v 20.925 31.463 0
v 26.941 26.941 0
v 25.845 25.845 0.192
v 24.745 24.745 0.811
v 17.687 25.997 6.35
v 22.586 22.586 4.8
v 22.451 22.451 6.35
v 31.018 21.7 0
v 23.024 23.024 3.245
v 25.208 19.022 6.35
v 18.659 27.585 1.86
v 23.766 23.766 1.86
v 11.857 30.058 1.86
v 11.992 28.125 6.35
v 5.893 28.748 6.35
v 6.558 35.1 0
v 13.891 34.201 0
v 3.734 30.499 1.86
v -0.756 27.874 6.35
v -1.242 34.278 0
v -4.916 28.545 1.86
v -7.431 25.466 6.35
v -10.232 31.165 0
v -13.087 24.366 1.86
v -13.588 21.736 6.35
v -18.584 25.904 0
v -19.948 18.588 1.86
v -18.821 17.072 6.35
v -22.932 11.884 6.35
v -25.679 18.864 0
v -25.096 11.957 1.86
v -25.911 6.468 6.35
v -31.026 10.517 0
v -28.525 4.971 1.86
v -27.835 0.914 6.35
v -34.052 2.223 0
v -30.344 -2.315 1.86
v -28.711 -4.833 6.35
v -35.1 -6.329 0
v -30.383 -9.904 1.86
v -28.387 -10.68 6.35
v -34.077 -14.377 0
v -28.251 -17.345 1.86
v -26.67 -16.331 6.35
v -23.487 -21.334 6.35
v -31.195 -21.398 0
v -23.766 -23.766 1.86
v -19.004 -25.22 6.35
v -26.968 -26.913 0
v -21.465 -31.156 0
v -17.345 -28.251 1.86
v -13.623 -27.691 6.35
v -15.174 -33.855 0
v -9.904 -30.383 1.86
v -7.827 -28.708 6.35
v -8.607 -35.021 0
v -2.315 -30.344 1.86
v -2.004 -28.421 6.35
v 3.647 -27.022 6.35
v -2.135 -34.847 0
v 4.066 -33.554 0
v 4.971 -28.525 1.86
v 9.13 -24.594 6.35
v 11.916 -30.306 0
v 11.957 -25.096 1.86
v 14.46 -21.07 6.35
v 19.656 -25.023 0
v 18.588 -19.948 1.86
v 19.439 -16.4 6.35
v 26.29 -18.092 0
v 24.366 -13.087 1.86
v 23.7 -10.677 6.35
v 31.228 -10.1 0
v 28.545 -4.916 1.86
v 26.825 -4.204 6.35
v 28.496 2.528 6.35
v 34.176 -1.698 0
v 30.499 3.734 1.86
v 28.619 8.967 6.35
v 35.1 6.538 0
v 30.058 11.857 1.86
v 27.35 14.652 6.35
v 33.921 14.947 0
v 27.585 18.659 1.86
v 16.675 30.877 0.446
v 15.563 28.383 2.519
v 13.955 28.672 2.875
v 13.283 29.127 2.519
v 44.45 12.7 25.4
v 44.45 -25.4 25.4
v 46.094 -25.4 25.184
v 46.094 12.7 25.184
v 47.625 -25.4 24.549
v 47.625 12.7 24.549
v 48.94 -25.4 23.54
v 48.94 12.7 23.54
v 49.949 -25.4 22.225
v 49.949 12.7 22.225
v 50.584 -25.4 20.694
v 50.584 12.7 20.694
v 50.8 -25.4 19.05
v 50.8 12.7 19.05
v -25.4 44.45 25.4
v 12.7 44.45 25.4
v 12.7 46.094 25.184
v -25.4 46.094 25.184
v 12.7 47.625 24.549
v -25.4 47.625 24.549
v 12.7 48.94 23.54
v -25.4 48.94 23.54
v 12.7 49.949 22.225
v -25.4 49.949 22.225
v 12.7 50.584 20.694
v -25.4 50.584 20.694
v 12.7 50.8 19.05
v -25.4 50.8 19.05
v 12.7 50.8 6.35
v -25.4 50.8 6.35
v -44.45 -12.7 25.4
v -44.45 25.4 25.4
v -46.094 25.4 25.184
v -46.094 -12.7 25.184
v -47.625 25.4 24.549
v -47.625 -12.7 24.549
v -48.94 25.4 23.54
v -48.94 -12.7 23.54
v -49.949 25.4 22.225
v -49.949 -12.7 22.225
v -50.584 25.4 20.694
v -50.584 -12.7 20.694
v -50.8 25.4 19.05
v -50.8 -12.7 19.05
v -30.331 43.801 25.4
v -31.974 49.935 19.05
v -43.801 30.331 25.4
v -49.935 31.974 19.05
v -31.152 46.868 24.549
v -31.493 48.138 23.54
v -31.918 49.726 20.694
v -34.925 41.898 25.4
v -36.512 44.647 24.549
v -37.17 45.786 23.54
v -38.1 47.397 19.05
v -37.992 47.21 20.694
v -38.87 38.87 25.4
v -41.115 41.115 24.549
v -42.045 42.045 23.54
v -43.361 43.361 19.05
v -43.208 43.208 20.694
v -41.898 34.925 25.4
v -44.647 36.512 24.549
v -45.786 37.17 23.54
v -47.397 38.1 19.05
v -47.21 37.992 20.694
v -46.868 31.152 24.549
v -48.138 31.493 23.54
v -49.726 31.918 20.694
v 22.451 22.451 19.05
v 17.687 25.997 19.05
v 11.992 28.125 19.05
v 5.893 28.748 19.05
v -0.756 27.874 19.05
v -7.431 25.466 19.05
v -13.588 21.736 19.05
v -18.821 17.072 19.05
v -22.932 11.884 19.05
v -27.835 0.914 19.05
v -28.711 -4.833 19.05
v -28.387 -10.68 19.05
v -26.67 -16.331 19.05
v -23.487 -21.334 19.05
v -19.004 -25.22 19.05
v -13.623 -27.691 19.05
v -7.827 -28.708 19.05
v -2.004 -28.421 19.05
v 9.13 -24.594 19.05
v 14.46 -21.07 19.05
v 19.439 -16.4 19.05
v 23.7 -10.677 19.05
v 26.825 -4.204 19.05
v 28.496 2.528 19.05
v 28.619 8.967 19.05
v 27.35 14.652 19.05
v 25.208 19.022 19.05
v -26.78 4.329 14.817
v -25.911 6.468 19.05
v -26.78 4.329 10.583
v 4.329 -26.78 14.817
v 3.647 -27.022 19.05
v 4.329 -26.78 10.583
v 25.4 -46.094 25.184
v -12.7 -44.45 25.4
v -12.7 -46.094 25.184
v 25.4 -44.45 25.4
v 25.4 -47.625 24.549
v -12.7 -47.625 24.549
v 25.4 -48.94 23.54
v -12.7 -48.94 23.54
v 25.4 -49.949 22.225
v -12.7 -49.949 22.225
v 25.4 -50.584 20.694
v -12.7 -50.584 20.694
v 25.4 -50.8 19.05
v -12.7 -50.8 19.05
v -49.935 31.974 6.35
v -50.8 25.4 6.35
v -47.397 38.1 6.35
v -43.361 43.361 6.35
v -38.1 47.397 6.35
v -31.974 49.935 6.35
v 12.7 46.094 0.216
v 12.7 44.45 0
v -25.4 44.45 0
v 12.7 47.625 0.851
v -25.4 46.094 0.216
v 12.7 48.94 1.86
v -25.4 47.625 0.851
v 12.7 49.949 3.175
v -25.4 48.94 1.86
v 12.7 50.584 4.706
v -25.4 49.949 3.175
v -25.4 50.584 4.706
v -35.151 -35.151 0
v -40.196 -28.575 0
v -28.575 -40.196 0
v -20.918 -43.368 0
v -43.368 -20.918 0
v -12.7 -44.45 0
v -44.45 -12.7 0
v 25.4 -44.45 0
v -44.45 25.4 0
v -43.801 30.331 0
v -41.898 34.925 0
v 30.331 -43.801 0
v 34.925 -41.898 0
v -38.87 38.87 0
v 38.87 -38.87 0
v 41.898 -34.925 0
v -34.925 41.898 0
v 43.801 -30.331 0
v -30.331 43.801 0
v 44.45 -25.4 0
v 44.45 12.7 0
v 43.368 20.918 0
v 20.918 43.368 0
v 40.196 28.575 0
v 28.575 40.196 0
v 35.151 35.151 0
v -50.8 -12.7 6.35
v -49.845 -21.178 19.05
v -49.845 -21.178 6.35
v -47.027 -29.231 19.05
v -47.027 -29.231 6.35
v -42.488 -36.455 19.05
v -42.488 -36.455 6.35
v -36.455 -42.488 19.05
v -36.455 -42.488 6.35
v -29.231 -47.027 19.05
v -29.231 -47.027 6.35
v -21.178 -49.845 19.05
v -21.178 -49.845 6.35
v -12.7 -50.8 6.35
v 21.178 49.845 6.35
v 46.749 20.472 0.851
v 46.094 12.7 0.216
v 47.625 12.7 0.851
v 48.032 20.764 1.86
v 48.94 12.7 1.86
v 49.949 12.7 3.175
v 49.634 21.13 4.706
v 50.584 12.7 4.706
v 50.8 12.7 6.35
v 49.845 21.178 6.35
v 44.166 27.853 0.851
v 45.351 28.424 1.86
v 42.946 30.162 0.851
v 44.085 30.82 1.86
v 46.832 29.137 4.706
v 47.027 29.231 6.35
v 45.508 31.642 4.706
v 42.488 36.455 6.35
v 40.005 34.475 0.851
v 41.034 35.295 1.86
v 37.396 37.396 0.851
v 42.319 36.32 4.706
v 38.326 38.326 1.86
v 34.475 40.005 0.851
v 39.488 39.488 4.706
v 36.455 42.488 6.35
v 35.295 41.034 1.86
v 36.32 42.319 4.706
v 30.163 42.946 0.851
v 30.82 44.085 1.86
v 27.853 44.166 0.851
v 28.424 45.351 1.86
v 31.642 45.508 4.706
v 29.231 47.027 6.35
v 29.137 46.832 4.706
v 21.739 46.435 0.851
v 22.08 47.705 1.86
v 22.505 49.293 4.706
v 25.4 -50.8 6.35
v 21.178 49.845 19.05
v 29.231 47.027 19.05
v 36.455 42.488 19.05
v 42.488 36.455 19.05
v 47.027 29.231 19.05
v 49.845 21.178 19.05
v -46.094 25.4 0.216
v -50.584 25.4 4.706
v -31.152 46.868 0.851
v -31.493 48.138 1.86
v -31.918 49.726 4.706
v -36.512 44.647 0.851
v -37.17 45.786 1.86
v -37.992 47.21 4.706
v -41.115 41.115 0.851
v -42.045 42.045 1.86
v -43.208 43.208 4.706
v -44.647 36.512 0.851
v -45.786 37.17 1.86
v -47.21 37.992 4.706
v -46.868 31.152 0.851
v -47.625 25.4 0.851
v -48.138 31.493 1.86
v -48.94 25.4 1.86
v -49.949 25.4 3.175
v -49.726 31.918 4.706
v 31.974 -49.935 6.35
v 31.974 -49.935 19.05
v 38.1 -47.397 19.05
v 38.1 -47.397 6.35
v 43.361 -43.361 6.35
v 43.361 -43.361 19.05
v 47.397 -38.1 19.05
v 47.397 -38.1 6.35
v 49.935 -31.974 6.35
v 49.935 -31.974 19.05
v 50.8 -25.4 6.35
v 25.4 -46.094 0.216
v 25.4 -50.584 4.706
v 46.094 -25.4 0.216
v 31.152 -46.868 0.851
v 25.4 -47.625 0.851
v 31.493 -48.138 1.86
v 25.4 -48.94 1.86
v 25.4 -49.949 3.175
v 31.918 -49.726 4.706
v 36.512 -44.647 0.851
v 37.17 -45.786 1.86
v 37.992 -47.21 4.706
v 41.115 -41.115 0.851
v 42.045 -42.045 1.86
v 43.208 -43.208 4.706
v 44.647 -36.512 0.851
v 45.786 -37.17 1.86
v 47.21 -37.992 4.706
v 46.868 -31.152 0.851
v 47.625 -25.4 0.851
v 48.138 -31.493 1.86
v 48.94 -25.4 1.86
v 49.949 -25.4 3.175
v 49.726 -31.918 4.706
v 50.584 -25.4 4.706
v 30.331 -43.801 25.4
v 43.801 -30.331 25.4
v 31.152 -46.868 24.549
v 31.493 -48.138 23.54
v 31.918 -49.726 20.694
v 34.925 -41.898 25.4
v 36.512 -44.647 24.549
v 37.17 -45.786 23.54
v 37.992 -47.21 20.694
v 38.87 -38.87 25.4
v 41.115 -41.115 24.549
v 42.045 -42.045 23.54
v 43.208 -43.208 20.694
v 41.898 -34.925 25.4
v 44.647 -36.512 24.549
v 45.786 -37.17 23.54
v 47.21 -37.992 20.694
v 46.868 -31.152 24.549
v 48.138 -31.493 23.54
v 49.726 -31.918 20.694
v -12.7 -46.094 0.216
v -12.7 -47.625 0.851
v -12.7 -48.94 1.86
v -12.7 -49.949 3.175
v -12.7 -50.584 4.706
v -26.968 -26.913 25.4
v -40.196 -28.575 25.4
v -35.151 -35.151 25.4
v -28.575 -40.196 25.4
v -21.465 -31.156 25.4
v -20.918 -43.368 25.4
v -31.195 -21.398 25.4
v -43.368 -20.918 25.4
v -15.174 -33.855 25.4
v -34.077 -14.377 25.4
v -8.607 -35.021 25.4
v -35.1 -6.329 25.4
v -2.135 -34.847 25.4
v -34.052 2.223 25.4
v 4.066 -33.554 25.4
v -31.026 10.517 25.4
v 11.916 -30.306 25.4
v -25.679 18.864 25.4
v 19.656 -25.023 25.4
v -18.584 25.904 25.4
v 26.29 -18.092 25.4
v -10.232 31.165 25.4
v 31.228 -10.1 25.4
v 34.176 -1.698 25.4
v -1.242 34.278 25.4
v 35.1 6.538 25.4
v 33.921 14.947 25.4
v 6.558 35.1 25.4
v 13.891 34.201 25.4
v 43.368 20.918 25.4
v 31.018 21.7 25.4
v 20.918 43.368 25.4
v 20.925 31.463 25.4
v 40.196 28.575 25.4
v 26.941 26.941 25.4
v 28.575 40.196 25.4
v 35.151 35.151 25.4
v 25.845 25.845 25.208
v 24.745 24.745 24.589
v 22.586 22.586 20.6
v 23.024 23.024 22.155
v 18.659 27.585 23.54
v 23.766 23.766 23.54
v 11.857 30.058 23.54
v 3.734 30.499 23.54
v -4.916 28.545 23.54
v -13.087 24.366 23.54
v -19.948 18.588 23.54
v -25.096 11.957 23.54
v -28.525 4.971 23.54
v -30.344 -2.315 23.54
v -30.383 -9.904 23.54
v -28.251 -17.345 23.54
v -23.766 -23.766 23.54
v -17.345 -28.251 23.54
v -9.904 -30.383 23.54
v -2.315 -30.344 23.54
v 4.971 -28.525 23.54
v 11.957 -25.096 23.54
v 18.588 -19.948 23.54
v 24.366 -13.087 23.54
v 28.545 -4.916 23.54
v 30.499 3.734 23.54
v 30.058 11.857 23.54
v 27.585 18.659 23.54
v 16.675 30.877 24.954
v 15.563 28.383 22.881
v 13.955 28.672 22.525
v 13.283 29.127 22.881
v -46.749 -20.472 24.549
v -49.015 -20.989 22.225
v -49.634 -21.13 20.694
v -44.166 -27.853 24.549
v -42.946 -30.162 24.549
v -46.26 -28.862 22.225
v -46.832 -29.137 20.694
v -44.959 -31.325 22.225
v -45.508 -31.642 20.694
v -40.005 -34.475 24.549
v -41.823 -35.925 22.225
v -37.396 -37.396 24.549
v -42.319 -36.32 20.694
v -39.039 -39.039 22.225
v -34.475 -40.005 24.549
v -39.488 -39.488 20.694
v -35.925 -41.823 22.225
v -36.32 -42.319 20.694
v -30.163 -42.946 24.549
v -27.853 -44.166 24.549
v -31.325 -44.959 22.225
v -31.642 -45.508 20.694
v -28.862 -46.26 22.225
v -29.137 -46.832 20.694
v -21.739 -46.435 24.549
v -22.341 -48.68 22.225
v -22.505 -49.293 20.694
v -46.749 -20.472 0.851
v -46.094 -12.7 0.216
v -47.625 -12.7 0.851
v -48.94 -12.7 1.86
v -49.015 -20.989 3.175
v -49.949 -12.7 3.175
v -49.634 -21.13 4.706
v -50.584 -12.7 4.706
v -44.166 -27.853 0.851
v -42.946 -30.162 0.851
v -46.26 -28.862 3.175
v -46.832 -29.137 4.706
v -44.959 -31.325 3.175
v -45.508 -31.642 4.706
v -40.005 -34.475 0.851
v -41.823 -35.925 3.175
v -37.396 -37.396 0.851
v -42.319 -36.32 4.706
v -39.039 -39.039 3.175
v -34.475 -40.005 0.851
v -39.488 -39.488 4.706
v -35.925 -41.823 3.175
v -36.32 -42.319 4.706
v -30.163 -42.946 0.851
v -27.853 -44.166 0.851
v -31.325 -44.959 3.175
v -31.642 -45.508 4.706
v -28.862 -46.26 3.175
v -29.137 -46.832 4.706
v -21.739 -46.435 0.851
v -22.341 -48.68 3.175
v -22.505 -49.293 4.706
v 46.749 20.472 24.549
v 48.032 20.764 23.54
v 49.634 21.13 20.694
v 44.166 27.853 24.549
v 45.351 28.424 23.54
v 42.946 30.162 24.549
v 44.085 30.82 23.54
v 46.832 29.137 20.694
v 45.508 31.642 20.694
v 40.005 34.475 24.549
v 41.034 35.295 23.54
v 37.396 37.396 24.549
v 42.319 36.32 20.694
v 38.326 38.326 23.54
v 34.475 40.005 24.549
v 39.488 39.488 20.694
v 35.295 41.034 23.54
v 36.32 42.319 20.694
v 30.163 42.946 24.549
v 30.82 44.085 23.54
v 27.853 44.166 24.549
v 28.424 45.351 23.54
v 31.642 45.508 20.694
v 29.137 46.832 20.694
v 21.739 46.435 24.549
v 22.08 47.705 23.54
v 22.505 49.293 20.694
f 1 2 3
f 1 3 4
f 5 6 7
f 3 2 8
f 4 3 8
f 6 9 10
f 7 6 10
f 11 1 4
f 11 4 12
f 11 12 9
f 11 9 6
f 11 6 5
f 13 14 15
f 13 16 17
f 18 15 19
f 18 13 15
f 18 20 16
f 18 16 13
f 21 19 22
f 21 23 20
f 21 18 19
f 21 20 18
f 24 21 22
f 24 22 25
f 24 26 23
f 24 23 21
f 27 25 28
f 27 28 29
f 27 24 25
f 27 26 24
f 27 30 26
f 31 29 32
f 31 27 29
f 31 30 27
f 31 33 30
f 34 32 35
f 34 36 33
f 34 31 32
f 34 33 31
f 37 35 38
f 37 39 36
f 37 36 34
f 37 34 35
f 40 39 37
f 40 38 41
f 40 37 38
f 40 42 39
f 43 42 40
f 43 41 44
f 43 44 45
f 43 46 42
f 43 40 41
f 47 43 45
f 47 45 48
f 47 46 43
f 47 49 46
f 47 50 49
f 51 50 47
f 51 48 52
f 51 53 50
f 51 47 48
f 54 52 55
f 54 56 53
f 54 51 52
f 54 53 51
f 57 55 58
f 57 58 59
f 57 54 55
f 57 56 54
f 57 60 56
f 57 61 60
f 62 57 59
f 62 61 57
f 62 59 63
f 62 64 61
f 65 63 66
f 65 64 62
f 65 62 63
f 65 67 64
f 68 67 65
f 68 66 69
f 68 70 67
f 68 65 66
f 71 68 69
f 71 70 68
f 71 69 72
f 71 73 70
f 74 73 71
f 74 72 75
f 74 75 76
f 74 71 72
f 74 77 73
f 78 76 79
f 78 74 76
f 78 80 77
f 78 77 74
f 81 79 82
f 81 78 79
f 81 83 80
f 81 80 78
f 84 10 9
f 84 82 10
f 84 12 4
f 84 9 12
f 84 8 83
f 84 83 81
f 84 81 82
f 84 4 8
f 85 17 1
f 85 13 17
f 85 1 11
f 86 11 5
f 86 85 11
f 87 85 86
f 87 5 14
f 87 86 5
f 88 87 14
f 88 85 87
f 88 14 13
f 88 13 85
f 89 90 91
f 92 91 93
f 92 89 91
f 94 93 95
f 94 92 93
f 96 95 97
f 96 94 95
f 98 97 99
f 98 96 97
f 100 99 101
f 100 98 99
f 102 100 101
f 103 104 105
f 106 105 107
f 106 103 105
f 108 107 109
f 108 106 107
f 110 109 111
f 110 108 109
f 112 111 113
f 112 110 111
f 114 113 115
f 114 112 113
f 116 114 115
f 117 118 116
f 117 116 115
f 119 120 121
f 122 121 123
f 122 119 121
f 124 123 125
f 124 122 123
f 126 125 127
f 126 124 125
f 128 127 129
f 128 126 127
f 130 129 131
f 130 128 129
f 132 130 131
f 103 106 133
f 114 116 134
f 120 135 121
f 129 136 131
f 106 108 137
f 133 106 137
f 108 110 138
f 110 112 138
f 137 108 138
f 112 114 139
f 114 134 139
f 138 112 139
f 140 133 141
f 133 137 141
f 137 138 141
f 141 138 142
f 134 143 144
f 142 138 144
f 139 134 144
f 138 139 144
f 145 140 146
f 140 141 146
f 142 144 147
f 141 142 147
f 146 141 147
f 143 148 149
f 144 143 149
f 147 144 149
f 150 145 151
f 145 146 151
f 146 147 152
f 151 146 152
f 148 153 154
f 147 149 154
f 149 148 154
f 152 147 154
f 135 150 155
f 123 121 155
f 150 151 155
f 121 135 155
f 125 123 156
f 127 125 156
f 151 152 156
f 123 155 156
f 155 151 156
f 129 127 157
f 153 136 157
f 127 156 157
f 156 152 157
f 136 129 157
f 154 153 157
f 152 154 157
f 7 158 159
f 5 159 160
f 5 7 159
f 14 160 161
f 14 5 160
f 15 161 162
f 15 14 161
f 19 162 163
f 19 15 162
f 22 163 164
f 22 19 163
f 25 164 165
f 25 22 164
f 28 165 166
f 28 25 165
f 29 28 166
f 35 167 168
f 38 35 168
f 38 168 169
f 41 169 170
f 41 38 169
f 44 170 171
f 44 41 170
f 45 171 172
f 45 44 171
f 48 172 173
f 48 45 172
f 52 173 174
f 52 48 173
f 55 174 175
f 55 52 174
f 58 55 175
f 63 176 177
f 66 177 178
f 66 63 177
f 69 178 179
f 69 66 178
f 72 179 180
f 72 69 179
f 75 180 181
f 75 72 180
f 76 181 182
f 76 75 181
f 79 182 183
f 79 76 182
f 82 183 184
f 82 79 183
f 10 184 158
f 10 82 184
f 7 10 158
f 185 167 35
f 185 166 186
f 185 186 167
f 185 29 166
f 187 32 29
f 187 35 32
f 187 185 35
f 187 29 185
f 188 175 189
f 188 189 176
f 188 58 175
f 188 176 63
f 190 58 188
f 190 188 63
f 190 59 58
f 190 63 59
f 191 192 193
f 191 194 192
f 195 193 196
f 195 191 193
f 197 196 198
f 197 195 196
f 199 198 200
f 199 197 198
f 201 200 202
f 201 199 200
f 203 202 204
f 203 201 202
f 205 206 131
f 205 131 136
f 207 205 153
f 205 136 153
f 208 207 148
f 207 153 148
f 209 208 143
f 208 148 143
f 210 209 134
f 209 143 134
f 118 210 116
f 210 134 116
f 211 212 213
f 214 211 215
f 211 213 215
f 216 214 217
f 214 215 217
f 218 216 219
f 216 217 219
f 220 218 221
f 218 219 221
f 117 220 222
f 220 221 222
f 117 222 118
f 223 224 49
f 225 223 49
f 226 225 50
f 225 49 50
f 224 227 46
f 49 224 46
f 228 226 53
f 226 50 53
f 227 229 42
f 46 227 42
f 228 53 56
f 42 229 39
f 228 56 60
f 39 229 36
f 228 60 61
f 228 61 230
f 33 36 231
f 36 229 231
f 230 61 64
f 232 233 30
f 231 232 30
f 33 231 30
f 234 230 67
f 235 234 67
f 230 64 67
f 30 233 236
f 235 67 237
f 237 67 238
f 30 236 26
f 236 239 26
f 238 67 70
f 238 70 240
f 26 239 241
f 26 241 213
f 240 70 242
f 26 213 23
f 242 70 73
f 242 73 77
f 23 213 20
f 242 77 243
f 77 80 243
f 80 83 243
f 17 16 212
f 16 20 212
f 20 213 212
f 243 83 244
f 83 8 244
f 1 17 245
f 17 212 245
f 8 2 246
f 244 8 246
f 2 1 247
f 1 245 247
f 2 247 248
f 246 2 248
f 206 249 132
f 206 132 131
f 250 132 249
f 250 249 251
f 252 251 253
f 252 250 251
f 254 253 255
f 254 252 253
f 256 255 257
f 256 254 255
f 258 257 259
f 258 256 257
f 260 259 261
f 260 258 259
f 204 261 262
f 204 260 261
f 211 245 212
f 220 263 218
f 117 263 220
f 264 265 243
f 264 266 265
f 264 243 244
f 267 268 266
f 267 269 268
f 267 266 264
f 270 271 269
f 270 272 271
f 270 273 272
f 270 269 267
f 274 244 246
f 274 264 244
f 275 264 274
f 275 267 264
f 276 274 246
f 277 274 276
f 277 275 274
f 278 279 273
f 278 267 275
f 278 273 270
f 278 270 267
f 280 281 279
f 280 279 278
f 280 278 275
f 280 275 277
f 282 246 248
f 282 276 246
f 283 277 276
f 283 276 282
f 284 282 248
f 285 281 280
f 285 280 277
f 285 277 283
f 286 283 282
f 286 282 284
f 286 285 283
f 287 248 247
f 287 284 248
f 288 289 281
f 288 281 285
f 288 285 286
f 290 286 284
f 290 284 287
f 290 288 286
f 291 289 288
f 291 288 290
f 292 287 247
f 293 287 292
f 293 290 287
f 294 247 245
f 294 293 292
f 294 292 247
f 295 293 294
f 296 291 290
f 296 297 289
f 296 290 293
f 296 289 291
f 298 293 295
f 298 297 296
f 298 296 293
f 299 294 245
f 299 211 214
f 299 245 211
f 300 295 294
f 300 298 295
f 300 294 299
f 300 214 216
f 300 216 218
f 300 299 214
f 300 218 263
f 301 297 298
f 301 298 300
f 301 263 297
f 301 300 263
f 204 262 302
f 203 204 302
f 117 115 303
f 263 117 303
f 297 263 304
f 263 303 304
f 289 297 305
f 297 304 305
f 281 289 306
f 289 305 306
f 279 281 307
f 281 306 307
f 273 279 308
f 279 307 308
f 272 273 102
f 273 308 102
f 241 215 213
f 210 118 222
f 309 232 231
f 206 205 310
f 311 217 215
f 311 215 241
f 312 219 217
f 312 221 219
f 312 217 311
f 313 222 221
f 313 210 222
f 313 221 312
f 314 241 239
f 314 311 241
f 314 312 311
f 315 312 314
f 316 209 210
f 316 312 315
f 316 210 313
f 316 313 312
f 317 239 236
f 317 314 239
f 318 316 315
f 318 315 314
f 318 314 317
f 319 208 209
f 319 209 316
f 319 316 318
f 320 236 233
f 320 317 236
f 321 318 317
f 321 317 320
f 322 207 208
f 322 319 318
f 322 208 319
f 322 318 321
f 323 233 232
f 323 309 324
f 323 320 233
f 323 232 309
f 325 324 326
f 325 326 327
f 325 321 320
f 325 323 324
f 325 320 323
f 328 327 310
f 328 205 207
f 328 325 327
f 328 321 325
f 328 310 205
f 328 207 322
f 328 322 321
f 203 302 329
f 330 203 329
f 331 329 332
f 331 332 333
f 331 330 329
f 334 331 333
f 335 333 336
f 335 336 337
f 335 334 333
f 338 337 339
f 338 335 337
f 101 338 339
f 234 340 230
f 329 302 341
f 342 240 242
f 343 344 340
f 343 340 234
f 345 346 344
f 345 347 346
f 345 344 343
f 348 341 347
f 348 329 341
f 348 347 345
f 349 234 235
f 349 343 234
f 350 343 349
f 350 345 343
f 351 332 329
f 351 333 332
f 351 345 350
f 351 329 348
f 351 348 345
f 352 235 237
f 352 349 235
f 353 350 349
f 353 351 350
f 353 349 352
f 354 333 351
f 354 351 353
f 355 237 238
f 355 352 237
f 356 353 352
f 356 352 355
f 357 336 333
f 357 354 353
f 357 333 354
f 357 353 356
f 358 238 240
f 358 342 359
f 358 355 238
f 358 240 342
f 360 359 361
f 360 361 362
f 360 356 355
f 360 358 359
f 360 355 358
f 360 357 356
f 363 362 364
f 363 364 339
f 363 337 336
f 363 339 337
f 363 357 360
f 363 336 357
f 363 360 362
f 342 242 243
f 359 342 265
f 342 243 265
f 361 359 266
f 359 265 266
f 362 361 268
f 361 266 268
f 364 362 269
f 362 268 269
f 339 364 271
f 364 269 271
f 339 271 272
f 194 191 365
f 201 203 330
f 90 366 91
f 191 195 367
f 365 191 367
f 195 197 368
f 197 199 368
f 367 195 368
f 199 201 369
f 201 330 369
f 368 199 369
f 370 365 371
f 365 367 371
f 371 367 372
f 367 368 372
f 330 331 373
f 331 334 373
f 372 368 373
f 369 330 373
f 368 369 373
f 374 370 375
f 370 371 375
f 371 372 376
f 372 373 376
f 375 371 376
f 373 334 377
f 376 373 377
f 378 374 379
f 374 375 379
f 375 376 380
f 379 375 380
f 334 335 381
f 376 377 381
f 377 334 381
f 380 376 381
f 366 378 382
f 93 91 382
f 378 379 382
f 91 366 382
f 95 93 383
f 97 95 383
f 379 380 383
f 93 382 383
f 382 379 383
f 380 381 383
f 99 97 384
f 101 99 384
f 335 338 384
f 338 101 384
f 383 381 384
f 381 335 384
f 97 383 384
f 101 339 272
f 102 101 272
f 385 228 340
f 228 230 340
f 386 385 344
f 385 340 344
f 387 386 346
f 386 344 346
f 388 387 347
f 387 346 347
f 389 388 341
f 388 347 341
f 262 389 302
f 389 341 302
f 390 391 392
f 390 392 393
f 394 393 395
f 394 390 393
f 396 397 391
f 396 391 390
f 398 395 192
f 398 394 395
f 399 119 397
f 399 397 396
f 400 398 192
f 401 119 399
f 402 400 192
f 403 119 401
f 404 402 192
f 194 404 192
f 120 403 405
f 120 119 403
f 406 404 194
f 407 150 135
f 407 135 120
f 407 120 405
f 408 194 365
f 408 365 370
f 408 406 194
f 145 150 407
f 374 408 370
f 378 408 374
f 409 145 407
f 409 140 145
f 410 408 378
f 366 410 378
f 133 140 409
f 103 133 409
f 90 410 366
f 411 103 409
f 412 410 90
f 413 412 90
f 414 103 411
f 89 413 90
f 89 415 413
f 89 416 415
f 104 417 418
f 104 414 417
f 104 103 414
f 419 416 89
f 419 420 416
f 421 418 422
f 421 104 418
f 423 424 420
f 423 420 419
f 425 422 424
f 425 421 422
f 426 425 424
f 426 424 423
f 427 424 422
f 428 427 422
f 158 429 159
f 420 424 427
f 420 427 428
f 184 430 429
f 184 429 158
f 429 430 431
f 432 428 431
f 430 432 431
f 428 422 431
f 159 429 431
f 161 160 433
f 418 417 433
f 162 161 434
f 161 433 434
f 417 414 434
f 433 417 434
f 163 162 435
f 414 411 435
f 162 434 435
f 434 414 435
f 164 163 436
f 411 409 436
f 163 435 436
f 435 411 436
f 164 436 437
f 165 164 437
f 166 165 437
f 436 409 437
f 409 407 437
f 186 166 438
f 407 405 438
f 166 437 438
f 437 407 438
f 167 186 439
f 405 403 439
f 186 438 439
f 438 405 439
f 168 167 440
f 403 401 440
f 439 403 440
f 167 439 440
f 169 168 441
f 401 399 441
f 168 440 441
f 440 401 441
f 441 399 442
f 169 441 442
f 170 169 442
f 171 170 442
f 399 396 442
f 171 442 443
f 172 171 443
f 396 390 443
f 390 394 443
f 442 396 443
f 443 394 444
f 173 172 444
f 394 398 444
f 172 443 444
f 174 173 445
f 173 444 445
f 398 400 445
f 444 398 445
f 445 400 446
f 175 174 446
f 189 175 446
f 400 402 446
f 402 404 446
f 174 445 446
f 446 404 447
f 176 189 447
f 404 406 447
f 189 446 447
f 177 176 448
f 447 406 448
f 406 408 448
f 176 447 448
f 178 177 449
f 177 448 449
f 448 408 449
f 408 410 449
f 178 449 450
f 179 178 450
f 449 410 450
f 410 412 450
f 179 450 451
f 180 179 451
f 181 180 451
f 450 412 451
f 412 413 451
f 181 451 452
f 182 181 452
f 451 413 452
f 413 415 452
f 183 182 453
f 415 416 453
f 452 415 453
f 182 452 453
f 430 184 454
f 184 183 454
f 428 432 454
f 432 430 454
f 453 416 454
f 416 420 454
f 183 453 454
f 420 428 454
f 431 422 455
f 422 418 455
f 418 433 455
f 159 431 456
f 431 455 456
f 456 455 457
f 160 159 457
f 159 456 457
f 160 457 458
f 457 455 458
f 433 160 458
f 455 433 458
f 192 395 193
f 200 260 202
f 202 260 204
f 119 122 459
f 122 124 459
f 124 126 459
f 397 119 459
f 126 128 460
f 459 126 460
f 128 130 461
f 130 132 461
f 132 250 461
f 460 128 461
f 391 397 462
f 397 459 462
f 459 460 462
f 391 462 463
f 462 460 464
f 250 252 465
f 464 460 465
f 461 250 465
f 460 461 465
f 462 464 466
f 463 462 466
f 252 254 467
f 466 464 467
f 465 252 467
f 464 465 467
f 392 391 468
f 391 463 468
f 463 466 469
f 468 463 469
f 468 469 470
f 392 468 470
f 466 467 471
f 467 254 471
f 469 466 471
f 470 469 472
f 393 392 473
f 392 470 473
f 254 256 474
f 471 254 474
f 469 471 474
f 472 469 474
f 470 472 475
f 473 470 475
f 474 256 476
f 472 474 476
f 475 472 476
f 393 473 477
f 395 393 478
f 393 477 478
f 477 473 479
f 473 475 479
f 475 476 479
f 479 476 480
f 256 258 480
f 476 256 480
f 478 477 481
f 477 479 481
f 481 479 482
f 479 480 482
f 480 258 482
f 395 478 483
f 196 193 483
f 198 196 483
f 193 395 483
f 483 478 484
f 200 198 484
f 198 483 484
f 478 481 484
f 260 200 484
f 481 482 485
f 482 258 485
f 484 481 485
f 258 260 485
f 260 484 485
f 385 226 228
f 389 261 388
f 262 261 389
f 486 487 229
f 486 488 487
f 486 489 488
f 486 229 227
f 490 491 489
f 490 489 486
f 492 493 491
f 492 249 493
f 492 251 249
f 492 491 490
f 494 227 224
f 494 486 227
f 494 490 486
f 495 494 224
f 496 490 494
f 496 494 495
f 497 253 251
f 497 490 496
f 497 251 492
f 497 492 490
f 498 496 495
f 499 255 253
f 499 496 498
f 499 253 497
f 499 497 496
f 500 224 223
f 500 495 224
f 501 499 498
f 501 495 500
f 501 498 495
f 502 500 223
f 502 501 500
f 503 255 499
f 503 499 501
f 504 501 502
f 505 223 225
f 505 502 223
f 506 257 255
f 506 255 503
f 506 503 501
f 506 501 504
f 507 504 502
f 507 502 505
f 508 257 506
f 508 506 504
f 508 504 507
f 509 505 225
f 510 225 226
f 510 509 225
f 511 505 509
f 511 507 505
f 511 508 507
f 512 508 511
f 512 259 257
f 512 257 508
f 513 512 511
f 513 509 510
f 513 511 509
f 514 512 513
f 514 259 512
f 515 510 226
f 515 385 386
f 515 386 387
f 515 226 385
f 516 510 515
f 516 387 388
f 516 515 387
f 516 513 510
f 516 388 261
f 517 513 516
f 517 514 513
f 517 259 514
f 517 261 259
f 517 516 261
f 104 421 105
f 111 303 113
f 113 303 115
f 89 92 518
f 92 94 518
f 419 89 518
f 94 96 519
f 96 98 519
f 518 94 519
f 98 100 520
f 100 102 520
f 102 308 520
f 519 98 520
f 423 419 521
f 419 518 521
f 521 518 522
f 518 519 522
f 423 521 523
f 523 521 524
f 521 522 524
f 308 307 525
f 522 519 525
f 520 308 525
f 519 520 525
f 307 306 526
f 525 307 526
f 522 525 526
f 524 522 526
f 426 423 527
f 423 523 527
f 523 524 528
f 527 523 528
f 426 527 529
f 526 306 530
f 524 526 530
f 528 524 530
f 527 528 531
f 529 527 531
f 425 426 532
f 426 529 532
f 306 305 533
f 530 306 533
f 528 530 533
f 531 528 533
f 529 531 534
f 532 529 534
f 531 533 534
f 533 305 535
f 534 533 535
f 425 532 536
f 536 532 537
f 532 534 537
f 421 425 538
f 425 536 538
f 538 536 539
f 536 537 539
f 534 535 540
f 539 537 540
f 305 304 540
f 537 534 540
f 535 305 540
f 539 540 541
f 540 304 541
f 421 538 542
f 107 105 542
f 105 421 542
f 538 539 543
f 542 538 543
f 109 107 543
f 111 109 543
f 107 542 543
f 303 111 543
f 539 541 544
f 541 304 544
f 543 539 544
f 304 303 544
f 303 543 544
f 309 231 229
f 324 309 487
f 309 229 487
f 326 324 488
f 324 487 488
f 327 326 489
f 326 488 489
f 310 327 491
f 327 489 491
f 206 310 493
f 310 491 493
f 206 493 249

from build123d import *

# Parameters (mm, degrees)
F0_W     = 101.6
F0_H     = 101.6
F1_DEPTH = 25.4
F2_R     = 25.4
F3_R     = 38.1
F4_R     = 6.35


with BuildPart() as f1:
    # F0 (on Top) → F1 (new body)
    with BuildSketch(Plane.XY):
        Rectangle(F0_W, F0_H)
        with BuildLine():
            add(Edge.make_bspline(
                [(22.45064, 22.45064), (-8.657879, 53.55916), (-26.77958, 4.32894), (-44.901281, -44.901281), (4.32894, -26.77958), (53.55916, -8.657879), (22.45064, 22.45064)],
                knots=[0, 0, 0, 2.094395, 2.094395, 4.18879, 4.18879, 6.283185, 6.283185, 6.283185], degree=2, weights=[1, 0.5, 1, 0.5, 1, 0.5, 1]))
        make_face(mode=Mode.SUBTRACT)
    extrude(amount=F1_DEPTH)

    # F2
    f2_edges = [f1.edges().sort_by_distance(p)[0] for p in [
        (50.8, -50.8, 12.7),
        (-50.8, 50.8, 12.7),
    ]]
    fillet(f2_edges, radius=F2_R)

    # F3
    f3_edges = [f1.edges().sort_by_distance(p)[0] for p in [
        (50.8, 50.8, 12.7),
        (-50.8, -50.8, 12.7),
    ]]
    fillet(f3_edges, radius=F3_R)

    # F4
    f4_edges = [f1.edges().sort_by_distance(p)[0] for p in [
        (6.35, -50.8, 25.4),
        (6.35, -50.8, 0),
        (-22.45064, -22.45064, 25.4),
        (-22.45064, -22.45064, 0),
    ]]
    fillet(f4_edges, radius=F4_R)


solid = f1.part
